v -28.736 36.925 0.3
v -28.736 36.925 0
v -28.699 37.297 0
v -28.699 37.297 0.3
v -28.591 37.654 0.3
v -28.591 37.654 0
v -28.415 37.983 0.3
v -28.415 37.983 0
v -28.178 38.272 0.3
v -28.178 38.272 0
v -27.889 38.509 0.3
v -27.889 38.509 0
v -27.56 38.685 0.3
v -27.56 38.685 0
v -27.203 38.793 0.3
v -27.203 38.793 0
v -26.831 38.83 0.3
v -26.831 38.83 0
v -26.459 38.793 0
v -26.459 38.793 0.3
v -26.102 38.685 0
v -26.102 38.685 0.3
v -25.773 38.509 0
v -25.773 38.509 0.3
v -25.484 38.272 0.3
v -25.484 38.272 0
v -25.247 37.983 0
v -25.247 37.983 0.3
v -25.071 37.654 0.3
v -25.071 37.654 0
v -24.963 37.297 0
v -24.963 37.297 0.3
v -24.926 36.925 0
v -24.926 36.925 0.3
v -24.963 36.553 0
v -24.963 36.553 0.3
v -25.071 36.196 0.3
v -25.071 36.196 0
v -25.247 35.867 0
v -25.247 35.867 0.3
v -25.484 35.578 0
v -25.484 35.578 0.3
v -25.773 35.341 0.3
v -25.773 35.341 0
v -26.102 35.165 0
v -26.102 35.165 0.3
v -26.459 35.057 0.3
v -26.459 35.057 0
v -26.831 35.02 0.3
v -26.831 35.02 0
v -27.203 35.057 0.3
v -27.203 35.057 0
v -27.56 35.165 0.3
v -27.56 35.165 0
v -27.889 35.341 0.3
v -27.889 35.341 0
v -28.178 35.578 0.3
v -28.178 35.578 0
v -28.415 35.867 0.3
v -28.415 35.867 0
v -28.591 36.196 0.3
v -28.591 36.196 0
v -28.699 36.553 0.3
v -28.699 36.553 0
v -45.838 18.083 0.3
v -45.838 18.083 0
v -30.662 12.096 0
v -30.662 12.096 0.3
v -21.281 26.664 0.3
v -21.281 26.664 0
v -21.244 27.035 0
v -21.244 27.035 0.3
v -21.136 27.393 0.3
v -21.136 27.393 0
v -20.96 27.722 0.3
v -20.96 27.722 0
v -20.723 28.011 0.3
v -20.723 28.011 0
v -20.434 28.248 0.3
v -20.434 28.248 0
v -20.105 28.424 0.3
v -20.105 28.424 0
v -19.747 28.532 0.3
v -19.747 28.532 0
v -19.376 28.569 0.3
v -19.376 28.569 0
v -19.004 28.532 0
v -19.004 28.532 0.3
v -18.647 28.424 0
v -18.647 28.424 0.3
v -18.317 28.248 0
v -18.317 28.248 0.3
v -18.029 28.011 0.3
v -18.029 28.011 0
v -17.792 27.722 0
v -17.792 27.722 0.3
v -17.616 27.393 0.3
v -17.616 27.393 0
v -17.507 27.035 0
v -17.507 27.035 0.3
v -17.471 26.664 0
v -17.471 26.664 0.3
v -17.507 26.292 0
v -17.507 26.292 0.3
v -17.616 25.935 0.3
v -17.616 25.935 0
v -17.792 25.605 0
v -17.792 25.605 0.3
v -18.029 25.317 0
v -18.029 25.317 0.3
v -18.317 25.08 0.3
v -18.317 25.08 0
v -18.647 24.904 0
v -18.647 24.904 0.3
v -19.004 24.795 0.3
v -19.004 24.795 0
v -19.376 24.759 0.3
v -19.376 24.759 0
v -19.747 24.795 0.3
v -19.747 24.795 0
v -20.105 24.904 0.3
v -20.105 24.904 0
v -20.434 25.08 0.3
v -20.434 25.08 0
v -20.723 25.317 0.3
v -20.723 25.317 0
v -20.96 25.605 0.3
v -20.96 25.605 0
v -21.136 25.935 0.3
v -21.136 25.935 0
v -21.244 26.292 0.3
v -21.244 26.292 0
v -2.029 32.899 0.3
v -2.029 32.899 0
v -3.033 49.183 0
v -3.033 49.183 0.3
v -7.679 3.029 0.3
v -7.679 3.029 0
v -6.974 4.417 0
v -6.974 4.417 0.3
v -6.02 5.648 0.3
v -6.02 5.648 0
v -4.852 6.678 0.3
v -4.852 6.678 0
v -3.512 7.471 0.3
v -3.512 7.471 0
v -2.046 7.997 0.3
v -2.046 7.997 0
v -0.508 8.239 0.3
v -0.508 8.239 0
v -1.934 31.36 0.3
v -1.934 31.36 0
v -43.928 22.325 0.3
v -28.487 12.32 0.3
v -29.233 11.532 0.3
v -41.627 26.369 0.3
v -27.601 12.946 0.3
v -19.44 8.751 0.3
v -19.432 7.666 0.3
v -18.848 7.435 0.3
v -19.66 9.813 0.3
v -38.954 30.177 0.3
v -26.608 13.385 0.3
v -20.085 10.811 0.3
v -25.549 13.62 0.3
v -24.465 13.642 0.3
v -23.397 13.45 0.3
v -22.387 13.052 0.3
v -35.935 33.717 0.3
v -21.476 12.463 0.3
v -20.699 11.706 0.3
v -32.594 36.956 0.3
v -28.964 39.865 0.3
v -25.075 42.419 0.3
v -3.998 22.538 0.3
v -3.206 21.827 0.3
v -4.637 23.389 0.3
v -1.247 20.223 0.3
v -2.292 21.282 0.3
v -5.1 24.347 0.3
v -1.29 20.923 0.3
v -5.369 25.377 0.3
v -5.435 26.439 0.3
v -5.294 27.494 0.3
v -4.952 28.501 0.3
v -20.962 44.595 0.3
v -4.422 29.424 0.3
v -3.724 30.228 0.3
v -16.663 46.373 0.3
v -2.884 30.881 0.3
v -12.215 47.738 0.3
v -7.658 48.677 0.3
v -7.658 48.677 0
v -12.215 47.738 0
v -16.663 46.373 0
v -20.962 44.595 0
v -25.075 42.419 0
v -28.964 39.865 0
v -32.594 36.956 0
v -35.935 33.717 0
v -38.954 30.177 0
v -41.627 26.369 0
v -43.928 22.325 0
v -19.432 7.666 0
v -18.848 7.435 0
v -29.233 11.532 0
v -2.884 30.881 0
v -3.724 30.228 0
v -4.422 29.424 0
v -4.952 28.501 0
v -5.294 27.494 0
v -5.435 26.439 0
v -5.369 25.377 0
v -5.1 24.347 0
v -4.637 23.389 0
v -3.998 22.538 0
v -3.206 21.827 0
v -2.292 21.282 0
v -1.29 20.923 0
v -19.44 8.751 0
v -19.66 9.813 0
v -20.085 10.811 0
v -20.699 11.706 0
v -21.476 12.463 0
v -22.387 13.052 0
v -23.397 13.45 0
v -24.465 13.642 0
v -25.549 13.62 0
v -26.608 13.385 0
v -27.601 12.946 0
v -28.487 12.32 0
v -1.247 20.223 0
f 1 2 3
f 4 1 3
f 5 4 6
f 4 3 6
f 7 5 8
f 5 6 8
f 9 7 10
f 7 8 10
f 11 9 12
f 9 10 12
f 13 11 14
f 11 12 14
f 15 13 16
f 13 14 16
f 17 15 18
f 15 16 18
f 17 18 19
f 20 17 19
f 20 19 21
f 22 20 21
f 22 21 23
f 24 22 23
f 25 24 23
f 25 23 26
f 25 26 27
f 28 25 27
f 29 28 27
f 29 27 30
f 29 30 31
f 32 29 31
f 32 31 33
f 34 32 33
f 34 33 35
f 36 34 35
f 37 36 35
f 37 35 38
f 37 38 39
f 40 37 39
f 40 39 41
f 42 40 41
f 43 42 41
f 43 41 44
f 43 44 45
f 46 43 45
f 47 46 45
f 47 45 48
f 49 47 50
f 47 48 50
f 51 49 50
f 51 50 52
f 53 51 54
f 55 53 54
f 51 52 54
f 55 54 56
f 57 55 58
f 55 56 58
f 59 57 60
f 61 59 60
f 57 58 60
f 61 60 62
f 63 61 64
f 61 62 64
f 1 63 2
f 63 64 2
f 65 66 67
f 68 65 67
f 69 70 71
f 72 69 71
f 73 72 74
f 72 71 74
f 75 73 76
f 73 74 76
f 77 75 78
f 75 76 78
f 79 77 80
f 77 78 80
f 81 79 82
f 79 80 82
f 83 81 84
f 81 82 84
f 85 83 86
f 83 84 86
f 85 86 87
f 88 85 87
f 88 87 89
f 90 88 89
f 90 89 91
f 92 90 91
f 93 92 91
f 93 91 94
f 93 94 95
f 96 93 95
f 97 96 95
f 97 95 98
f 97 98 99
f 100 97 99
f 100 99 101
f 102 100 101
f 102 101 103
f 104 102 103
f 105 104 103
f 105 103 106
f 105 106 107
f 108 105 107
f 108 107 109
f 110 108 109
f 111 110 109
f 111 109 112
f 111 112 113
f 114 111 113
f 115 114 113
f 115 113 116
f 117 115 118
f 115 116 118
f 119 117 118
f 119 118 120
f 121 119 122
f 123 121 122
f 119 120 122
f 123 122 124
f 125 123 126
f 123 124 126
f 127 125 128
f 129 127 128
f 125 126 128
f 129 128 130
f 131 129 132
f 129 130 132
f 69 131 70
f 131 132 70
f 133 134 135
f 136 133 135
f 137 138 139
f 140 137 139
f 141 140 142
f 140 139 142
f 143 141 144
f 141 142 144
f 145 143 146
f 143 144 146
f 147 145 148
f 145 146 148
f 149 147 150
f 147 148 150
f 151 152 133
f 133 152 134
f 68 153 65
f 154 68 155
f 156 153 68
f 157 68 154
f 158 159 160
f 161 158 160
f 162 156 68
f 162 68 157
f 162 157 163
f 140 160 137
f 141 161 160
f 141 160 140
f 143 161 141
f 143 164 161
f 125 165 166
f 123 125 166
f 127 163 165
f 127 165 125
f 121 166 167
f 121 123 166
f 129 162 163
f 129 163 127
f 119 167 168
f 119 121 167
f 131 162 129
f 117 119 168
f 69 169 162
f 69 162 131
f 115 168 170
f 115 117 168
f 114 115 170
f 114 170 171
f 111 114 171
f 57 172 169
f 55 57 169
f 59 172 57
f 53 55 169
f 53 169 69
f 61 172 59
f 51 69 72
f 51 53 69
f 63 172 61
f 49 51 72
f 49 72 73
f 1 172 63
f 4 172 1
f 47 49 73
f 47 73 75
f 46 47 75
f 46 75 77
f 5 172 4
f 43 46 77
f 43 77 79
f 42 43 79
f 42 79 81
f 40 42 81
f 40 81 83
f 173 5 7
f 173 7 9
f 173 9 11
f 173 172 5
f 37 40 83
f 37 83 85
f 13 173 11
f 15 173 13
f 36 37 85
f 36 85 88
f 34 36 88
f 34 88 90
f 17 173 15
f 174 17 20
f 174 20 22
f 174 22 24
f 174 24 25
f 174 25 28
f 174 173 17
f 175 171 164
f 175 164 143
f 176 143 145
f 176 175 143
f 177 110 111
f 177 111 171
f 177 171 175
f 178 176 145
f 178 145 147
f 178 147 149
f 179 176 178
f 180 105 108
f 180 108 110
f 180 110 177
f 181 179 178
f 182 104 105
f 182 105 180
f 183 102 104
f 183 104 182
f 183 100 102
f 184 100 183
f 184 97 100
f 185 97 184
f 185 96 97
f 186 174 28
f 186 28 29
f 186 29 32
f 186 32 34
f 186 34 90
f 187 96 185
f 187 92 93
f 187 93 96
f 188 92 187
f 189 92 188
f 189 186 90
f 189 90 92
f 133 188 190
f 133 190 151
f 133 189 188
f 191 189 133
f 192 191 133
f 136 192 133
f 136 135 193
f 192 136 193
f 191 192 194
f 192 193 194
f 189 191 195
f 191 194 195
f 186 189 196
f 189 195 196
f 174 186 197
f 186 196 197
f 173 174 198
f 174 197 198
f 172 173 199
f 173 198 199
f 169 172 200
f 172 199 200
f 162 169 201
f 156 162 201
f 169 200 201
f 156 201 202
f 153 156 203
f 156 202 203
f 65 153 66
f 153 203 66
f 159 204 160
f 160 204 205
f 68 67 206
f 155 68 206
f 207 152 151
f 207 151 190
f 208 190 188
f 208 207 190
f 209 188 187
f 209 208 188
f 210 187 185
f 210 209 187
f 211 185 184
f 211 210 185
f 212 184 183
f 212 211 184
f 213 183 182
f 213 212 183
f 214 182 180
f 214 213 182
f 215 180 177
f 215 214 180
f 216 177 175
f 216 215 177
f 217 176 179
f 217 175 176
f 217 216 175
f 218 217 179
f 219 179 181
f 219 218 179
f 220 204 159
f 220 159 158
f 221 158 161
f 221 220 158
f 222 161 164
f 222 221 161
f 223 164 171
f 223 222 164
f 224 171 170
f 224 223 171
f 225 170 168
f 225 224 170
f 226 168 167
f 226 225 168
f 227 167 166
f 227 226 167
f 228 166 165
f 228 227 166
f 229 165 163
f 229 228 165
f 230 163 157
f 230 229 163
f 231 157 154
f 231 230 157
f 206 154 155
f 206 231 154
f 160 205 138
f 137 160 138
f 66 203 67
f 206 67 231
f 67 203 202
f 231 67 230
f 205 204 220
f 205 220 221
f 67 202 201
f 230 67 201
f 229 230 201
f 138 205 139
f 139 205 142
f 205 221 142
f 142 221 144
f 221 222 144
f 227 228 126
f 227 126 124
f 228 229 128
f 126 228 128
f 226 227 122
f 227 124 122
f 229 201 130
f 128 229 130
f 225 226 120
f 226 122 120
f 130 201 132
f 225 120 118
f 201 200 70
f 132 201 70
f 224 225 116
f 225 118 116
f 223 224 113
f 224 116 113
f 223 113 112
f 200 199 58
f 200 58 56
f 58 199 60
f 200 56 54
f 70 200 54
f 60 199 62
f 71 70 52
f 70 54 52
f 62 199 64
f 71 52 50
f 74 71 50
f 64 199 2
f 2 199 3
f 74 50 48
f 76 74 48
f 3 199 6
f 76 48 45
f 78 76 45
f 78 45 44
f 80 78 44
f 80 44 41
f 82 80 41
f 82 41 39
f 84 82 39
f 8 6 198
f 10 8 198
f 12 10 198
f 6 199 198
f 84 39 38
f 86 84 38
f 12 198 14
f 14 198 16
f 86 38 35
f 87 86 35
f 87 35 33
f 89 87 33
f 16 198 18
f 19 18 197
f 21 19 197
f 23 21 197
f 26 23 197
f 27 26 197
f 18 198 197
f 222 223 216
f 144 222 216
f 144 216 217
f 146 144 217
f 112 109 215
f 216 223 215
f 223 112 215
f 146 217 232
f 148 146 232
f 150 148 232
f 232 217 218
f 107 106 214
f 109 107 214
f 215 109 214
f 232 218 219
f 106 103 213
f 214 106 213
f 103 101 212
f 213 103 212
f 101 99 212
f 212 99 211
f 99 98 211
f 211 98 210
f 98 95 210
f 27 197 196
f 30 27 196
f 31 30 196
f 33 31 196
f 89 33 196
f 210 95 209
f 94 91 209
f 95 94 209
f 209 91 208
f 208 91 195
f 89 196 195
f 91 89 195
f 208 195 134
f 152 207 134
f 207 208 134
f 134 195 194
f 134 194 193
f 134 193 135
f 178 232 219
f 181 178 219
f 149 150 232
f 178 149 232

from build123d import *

# Parameters (mm, degrees)
BOSS_EXTRUDE1_DEPTH = 0.3
SKETCH7_R           = 1.905
CUT_EXTRUDE3_DEPTH  = 68.232035618
CUT_EXTRUDE4_DEPTH  = 68.232035618


with BuildPart() as part:
    # Sketch5 → Boss-Extrude1 (new body)
    with BuildSketch(Plane.XY):
        with BuildLine():
            Line((-2.028916314, 32.899205852), (-3.033121883, 49.182561418))
            ThreePointArc((-3.033121883, 49.182561418), (-28.963706092, 39.865121415), (-45.838109317, 18.082917637))
            Line((-45.838109317, 18.082917637), (-30.662034486, 12.096027791))
            Line((-30.662034486, 12.096027791), (-18.848088785, 7.435482008))
            Line((-18.848088785, 7.435482008), (-7.679064705, 3.029354759))
            ThreePointArc((-7.679064705, 3.029354759), (-4.852167258, 6.678435289), (-0.508126089, 8.239346629))
            Line((-0.508126089, 8.239346629), (-1.24718387, 20.223287961))
            Line((-1.24718387, 20.223287961), (-2.028916314, 32.899205852))
        make_face()
    extrude(amount=BOSS_EXTRUDE1_DEPTH)

    # Sketch7 → Cut-Extrude3 (cut, through all)
    with BuildSketch(Plane(origin=(0, 0, 0), x_dir=(-1, 0, 0), z_dir=(0, 0, -1))):
        with Locations((26.831076285, 36.924921792)):
            Circle(SKETCH7_R)
        with Locations((19.375810402, 26.663628618)):
            Circle(SKETCH7_R)
    extrude(amount=-CUT_EXTRUDE3_DEPTH, mode=Mode.SUBTRACT)

    # Sketch8 → Cut-Extrude4 (cut, through all)
    with BuildSketch(Plane(origin=(0, 0, 0), x_dir=(-1, 0, 0), z_dir=(0, 0, -1))):
        with BuildLine():
            Line((1.290332778, 20.922954474), (1.933991563, 31.359985686))
            ThreePointArc((1.933991563, 31.359985686), (5.427783746, 25.906158112), (1.290332778, 20.922954474))
        make_face()
        with BuildLine():
            Line((29.233104835, 11.532321793), (19.432314115, 7.665956142))
            ThreePointArc((19.432314115, 7.665956142), (22.882252084, 13.27588106), (29.233104835, 11.532321793))
        make_face()
    extrude(amount=-CUT_EXTRUDE4_DEPTH, mode=Mode.SUBTRACT)


solid = part.part
